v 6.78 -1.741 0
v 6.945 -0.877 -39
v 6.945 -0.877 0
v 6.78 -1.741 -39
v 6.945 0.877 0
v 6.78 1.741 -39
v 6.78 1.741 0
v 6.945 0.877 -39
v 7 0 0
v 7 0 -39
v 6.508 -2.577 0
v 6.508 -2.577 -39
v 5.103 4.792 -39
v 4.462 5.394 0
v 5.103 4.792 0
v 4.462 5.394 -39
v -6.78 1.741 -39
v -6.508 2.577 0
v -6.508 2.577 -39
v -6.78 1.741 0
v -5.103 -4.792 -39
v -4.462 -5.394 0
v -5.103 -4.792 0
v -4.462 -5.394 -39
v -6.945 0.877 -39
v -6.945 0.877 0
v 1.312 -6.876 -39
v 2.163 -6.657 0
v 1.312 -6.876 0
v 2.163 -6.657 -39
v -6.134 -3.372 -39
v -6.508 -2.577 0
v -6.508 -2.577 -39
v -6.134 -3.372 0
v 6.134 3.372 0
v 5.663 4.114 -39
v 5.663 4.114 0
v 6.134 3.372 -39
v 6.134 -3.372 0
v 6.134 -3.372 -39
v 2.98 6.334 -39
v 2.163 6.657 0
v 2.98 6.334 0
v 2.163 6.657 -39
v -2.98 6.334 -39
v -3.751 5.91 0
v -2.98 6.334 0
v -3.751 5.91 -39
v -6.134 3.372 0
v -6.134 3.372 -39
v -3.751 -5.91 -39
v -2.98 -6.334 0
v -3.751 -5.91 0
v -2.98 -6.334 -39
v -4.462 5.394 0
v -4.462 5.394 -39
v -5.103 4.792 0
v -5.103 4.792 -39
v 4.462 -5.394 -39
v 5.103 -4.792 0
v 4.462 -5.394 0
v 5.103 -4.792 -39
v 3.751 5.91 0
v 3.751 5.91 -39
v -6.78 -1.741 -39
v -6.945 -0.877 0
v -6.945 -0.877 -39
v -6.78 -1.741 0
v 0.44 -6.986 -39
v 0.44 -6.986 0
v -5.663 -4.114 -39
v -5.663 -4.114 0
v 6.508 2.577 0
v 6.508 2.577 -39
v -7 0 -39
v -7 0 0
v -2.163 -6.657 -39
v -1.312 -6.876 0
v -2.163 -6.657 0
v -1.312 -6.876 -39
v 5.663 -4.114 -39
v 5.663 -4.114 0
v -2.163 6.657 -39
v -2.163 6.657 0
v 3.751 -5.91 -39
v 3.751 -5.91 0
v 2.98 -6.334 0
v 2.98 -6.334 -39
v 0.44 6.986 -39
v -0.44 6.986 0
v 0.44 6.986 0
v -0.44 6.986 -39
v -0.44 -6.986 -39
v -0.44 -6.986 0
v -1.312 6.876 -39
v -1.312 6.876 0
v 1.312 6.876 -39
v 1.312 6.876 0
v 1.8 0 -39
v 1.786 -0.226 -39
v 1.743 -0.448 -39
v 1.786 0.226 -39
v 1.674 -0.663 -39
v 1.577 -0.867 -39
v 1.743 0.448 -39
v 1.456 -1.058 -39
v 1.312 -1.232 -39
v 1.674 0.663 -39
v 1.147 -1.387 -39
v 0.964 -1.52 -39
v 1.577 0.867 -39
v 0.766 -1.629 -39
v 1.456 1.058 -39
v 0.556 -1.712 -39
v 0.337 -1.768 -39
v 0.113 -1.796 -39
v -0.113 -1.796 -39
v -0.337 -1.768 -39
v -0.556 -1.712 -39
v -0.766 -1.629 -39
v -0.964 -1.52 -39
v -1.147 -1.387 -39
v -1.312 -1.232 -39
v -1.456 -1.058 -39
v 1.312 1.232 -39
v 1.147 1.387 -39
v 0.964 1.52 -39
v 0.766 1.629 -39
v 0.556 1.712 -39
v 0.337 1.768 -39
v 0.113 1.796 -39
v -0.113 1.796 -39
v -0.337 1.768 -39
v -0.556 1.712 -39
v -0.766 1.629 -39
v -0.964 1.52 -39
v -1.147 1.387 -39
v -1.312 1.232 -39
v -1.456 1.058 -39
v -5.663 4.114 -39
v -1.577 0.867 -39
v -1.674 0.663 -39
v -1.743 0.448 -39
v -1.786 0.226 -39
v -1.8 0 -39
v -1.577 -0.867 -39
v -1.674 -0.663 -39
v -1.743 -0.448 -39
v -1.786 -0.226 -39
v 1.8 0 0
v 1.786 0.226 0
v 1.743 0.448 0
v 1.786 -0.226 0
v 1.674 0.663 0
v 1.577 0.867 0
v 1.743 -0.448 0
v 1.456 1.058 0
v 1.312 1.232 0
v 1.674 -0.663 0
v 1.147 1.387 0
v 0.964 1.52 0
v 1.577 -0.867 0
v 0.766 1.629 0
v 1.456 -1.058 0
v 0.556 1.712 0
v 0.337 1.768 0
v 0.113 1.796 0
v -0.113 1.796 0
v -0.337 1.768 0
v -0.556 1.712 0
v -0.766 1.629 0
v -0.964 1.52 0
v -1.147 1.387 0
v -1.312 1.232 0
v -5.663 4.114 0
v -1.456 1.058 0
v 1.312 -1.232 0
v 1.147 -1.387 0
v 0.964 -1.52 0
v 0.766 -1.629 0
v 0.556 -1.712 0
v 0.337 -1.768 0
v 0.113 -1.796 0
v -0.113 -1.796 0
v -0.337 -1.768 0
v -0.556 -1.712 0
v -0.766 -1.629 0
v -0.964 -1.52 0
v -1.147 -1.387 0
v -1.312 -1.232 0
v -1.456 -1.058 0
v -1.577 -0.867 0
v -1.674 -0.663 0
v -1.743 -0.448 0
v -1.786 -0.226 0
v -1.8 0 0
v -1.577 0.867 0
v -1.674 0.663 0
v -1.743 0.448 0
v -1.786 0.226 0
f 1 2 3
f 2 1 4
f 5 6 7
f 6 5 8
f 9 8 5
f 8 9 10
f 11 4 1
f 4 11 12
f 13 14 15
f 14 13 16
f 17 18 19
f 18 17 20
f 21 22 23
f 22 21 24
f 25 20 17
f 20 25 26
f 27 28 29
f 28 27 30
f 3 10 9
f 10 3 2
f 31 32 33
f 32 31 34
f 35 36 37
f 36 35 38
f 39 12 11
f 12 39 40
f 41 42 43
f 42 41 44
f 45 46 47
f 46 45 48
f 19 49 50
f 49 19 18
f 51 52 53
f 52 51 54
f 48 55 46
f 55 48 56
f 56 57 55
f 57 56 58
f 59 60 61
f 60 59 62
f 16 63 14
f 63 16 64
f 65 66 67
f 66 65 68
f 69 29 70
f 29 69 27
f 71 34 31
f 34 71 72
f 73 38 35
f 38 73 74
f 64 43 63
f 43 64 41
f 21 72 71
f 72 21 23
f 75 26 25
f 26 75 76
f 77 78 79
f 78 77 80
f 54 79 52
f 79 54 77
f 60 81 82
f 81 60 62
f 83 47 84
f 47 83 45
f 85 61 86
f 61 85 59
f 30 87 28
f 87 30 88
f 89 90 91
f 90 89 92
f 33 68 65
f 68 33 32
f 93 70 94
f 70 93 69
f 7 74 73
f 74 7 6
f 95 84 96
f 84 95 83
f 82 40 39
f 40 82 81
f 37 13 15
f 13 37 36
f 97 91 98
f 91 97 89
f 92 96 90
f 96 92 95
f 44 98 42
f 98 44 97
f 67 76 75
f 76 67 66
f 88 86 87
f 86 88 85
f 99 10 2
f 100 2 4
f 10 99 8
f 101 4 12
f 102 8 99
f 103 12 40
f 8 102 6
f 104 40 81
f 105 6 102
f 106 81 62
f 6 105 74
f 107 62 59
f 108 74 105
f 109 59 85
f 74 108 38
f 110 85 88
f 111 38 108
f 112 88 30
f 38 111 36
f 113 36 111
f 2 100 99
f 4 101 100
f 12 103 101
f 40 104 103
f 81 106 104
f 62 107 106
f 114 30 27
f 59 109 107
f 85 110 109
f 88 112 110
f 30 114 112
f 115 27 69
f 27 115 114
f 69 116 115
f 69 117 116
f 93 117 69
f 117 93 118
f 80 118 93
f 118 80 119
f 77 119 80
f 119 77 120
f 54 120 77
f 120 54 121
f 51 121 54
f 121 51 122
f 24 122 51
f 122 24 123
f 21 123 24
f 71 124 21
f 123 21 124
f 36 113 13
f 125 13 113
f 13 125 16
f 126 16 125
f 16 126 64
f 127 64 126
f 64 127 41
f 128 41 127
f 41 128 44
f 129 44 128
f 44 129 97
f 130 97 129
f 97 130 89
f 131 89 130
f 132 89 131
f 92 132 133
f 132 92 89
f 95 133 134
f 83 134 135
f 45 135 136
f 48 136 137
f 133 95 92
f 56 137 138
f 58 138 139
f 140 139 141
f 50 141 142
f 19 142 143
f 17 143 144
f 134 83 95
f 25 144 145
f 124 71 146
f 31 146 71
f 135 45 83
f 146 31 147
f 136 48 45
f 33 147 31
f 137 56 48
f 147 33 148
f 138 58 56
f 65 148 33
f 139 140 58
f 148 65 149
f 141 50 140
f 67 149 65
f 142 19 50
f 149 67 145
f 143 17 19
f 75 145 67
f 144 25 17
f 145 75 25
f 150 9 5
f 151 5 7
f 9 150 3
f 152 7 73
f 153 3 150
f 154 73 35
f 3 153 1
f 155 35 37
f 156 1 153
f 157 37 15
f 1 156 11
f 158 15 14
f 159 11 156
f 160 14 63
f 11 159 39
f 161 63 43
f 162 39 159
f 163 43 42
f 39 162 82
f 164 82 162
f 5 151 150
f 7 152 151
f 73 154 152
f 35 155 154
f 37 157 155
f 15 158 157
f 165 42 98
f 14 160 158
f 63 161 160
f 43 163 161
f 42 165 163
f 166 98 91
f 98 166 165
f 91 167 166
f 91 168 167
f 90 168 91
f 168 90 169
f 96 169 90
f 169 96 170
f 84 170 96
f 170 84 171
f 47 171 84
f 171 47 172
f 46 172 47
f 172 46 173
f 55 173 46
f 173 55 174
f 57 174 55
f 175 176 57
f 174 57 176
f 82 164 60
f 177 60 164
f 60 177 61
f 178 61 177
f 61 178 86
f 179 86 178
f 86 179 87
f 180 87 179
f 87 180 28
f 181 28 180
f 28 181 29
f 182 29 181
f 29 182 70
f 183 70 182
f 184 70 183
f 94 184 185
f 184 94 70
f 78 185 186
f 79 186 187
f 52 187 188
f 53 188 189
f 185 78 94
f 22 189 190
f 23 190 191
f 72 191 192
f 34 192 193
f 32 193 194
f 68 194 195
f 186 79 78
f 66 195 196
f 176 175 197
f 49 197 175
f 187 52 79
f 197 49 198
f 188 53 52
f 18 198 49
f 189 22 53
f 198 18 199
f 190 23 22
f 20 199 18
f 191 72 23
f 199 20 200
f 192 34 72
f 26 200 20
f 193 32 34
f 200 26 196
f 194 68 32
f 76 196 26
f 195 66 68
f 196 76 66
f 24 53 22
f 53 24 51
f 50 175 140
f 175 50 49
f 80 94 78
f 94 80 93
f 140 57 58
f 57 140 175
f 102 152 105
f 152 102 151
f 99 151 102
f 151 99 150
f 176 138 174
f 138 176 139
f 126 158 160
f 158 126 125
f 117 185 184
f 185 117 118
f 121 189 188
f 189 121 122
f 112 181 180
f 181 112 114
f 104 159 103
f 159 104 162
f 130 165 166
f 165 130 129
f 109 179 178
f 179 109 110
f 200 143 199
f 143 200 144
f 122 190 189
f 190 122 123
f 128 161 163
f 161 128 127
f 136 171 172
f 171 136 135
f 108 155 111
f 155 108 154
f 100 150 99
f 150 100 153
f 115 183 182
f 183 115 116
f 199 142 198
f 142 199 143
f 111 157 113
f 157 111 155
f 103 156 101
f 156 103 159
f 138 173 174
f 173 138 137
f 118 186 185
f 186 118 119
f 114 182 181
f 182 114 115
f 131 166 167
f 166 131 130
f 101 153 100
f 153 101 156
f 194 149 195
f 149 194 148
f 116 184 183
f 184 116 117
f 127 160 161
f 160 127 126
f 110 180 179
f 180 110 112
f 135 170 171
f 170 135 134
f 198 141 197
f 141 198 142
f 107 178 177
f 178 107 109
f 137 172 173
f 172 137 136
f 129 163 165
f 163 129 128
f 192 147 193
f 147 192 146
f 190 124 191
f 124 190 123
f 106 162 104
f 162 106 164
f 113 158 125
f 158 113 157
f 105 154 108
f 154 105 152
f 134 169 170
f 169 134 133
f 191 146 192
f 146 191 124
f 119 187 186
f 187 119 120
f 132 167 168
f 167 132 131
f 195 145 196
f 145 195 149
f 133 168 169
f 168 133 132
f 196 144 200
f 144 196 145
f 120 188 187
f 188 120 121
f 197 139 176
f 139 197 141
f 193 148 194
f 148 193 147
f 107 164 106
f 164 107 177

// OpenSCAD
$fn = 50;


difference() {
	union() {
		translate(v = [0, 0, -39.0000000000]) {
			cylinder(h = 39, r = 7.0000000000);
		}
		cylinder(h = 0, r = 17.0000000000);
	}
	union() {
		#translate(v = [0, 0, -39]) {
			cylinder(h = 39, r = 1.8000000000);
		}
	}
}
